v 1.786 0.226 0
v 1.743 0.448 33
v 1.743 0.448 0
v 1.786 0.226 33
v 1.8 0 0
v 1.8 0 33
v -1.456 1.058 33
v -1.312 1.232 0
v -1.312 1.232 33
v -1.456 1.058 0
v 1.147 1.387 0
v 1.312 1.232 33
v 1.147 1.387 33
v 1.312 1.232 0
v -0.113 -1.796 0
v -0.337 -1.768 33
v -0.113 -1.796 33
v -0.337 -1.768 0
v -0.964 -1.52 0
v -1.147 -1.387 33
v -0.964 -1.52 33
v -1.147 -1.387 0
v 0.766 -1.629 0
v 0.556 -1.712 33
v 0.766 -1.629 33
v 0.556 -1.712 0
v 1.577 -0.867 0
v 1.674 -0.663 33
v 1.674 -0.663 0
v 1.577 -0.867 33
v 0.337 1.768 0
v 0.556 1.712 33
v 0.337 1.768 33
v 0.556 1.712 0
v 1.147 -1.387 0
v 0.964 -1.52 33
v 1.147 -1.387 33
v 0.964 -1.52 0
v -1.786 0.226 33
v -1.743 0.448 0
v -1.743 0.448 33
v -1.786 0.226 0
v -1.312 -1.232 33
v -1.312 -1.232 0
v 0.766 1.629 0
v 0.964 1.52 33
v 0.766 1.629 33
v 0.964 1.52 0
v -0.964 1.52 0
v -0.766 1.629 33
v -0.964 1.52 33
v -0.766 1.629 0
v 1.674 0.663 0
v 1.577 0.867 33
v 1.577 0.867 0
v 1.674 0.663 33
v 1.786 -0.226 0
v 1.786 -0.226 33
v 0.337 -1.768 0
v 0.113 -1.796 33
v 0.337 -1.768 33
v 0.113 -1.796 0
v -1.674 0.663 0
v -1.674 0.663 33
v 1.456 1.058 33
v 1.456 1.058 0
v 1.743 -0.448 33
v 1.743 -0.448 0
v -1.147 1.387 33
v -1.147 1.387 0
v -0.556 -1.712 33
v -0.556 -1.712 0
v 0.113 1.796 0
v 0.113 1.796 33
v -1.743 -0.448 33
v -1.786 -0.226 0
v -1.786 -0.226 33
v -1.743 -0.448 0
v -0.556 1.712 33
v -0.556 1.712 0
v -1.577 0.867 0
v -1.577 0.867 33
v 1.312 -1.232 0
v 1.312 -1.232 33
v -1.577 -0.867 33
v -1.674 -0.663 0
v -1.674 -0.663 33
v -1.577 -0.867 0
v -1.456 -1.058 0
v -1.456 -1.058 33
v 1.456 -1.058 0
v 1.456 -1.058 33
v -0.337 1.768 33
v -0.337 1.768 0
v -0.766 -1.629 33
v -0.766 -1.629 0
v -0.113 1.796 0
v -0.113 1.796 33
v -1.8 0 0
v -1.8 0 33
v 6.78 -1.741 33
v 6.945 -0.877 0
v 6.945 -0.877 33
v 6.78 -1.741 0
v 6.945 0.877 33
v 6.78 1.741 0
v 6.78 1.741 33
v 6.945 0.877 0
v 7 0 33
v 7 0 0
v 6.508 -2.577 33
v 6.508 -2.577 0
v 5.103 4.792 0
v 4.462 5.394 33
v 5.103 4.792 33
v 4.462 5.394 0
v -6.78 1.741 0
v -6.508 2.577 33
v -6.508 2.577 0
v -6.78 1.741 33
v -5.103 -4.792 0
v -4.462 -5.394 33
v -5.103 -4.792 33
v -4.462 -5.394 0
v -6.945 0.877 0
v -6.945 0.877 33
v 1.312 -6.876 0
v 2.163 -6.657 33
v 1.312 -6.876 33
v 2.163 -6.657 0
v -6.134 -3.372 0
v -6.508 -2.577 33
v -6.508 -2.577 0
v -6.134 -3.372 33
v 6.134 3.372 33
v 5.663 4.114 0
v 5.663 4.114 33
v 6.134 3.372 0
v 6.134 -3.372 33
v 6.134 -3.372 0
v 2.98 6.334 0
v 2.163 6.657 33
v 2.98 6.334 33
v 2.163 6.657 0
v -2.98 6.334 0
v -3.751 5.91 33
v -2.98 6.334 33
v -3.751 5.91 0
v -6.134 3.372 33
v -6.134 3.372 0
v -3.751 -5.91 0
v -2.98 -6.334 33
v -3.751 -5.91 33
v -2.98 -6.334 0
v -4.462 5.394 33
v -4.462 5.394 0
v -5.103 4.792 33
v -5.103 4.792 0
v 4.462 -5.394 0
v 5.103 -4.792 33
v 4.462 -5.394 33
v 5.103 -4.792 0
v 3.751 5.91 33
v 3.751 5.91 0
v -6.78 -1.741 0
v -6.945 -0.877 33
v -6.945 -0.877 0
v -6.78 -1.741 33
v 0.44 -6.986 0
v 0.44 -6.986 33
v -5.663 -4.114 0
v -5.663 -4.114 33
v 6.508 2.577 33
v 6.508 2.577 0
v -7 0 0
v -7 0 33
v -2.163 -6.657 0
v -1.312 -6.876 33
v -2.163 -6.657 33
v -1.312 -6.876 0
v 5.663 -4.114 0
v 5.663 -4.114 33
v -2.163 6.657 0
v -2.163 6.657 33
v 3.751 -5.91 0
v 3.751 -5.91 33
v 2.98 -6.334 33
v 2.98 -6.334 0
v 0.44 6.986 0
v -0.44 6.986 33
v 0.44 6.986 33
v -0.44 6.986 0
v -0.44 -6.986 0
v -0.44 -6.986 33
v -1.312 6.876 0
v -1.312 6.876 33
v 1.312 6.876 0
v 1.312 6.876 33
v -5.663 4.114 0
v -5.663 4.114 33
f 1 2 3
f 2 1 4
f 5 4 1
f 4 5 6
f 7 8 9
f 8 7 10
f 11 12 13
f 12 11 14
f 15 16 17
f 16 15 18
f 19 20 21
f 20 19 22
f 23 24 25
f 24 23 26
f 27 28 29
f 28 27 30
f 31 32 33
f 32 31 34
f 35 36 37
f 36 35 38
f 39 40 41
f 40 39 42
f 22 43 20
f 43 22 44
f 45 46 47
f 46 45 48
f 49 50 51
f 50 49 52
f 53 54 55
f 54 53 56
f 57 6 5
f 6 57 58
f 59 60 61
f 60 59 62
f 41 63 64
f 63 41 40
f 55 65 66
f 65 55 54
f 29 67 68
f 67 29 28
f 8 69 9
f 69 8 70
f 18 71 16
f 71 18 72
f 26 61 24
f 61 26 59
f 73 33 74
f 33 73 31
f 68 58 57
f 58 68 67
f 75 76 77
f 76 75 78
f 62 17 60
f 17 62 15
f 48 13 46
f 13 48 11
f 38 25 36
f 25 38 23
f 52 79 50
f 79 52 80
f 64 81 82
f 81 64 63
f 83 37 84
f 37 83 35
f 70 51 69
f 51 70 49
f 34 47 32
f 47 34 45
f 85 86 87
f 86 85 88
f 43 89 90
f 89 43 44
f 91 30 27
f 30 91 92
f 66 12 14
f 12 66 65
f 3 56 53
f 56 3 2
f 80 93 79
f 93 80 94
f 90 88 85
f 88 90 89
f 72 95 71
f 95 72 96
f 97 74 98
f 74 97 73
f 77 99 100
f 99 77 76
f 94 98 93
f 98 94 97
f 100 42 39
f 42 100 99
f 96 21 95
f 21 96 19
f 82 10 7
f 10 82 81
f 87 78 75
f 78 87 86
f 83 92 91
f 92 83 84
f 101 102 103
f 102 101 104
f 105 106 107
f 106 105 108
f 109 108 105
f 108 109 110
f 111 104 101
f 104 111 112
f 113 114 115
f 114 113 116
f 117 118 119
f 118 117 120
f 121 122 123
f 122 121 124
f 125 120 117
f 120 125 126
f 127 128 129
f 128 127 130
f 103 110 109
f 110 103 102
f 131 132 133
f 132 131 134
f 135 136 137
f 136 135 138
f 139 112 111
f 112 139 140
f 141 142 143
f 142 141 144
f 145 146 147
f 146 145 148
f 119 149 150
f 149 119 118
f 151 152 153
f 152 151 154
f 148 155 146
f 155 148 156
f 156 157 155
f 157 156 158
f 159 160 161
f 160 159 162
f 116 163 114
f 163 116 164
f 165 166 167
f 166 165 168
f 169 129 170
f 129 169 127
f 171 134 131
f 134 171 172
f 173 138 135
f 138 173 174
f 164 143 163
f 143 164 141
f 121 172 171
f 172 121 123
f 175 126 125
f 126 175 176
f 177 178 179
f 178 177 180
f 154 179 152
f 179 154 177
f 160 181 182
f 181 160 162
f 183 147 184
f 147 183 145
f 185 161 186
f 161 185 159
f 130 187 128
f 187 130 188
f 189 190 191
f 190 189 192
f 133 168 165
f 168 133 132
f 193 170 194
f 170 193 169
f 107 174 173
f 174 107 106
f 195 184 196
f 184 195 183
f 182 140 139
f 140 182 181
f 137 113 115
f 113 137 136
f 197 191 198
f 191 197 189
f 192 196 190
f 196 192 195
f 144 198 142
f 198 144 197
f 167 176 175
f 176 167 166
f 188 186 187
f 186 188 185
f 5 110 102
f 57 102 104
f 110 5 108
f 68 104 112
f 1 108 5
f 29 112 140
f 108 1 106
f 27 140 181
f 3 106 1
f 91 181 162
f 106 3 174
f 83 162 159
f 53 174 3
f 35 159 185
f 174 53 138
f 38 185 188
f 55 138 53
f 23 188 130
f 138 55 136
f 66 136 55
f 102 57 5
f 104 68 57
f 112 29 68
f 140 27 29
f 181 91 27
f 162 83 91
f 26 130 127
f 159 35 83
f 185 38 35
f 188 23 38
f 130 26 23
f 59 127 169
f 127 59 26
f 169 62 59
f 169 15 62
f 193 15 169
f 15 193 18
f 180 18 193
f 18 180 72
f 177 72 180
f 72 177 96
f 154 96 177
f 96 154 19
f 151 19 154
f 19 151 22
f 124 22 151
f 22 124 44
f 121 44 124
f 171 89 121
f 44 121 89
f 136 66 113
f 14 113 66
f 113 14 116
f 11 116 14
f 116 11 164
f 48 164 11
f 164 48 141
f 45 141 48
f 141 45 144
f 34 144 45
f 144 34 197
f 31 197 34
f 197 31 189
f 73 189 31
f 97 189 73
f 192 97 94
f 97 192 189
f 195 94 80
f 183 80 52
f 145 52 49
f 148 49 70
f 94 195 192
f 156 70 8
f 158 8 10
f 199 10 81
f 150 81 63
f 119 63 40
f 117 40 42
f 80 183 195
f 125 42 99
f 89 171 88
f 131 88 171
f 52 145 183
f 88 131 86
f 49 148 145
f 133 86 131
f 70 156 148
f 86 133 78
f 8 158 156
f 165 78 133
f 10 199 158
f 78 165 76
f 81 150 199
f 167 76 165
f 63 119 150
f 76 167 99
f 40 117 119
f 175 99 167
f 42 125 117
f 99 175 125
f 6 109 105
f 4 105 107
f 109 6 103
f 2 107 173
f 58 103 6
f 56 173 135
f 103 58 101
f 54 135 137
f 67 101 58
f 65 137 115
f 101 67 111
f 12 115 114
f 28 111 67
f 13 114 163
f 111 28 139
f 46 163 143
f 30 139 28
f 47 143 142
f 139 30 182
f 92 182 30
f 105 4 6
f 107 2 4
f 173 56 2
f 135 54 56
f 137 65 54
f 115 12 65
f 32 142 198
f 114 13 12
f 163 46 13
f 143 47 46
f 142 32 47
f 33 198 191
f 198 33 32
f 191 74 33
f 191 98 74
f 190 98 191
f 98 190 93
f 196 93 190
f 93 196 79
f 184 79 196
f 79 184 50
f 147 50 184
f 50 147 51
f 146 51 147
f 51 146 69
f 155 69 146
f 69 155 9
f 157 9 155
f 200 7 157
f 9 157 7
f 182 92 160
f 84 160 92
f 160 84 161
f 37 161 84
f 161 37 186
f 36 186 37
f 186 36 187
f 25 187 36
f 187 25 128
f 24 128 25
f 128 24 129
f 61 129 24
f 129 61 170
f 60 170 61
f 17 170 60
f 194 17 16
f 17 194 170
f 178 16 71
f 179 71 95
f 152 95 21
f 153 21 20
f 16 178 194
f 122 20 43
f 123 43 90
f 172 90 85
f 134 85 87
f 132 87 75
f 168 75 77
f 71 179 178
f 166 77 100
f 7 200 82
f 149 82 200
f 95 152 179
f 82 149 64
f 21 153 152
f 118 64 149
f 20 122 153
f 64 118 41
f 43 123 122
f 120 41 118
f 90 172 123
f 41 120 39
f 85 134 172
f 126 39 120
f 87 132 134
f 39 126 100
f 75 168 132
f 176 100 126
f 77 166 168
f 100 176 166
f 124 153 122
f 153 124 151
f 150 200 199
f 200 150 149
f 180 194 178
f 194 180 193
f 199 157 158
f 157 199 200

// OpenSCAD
$fn = 50;


difference() {
	union() {
		cylinder(h = 33, r = 7.0000000000);
	}
	union() {
		translate(v = [0, 0, -100]) {
			cylinder(h = 200, r = 1.8000000000);
		}
		translate(v = [0, 0, -100]) {
			cylinder(h = 200, r = 1.8000000000);
		}
	}
}
